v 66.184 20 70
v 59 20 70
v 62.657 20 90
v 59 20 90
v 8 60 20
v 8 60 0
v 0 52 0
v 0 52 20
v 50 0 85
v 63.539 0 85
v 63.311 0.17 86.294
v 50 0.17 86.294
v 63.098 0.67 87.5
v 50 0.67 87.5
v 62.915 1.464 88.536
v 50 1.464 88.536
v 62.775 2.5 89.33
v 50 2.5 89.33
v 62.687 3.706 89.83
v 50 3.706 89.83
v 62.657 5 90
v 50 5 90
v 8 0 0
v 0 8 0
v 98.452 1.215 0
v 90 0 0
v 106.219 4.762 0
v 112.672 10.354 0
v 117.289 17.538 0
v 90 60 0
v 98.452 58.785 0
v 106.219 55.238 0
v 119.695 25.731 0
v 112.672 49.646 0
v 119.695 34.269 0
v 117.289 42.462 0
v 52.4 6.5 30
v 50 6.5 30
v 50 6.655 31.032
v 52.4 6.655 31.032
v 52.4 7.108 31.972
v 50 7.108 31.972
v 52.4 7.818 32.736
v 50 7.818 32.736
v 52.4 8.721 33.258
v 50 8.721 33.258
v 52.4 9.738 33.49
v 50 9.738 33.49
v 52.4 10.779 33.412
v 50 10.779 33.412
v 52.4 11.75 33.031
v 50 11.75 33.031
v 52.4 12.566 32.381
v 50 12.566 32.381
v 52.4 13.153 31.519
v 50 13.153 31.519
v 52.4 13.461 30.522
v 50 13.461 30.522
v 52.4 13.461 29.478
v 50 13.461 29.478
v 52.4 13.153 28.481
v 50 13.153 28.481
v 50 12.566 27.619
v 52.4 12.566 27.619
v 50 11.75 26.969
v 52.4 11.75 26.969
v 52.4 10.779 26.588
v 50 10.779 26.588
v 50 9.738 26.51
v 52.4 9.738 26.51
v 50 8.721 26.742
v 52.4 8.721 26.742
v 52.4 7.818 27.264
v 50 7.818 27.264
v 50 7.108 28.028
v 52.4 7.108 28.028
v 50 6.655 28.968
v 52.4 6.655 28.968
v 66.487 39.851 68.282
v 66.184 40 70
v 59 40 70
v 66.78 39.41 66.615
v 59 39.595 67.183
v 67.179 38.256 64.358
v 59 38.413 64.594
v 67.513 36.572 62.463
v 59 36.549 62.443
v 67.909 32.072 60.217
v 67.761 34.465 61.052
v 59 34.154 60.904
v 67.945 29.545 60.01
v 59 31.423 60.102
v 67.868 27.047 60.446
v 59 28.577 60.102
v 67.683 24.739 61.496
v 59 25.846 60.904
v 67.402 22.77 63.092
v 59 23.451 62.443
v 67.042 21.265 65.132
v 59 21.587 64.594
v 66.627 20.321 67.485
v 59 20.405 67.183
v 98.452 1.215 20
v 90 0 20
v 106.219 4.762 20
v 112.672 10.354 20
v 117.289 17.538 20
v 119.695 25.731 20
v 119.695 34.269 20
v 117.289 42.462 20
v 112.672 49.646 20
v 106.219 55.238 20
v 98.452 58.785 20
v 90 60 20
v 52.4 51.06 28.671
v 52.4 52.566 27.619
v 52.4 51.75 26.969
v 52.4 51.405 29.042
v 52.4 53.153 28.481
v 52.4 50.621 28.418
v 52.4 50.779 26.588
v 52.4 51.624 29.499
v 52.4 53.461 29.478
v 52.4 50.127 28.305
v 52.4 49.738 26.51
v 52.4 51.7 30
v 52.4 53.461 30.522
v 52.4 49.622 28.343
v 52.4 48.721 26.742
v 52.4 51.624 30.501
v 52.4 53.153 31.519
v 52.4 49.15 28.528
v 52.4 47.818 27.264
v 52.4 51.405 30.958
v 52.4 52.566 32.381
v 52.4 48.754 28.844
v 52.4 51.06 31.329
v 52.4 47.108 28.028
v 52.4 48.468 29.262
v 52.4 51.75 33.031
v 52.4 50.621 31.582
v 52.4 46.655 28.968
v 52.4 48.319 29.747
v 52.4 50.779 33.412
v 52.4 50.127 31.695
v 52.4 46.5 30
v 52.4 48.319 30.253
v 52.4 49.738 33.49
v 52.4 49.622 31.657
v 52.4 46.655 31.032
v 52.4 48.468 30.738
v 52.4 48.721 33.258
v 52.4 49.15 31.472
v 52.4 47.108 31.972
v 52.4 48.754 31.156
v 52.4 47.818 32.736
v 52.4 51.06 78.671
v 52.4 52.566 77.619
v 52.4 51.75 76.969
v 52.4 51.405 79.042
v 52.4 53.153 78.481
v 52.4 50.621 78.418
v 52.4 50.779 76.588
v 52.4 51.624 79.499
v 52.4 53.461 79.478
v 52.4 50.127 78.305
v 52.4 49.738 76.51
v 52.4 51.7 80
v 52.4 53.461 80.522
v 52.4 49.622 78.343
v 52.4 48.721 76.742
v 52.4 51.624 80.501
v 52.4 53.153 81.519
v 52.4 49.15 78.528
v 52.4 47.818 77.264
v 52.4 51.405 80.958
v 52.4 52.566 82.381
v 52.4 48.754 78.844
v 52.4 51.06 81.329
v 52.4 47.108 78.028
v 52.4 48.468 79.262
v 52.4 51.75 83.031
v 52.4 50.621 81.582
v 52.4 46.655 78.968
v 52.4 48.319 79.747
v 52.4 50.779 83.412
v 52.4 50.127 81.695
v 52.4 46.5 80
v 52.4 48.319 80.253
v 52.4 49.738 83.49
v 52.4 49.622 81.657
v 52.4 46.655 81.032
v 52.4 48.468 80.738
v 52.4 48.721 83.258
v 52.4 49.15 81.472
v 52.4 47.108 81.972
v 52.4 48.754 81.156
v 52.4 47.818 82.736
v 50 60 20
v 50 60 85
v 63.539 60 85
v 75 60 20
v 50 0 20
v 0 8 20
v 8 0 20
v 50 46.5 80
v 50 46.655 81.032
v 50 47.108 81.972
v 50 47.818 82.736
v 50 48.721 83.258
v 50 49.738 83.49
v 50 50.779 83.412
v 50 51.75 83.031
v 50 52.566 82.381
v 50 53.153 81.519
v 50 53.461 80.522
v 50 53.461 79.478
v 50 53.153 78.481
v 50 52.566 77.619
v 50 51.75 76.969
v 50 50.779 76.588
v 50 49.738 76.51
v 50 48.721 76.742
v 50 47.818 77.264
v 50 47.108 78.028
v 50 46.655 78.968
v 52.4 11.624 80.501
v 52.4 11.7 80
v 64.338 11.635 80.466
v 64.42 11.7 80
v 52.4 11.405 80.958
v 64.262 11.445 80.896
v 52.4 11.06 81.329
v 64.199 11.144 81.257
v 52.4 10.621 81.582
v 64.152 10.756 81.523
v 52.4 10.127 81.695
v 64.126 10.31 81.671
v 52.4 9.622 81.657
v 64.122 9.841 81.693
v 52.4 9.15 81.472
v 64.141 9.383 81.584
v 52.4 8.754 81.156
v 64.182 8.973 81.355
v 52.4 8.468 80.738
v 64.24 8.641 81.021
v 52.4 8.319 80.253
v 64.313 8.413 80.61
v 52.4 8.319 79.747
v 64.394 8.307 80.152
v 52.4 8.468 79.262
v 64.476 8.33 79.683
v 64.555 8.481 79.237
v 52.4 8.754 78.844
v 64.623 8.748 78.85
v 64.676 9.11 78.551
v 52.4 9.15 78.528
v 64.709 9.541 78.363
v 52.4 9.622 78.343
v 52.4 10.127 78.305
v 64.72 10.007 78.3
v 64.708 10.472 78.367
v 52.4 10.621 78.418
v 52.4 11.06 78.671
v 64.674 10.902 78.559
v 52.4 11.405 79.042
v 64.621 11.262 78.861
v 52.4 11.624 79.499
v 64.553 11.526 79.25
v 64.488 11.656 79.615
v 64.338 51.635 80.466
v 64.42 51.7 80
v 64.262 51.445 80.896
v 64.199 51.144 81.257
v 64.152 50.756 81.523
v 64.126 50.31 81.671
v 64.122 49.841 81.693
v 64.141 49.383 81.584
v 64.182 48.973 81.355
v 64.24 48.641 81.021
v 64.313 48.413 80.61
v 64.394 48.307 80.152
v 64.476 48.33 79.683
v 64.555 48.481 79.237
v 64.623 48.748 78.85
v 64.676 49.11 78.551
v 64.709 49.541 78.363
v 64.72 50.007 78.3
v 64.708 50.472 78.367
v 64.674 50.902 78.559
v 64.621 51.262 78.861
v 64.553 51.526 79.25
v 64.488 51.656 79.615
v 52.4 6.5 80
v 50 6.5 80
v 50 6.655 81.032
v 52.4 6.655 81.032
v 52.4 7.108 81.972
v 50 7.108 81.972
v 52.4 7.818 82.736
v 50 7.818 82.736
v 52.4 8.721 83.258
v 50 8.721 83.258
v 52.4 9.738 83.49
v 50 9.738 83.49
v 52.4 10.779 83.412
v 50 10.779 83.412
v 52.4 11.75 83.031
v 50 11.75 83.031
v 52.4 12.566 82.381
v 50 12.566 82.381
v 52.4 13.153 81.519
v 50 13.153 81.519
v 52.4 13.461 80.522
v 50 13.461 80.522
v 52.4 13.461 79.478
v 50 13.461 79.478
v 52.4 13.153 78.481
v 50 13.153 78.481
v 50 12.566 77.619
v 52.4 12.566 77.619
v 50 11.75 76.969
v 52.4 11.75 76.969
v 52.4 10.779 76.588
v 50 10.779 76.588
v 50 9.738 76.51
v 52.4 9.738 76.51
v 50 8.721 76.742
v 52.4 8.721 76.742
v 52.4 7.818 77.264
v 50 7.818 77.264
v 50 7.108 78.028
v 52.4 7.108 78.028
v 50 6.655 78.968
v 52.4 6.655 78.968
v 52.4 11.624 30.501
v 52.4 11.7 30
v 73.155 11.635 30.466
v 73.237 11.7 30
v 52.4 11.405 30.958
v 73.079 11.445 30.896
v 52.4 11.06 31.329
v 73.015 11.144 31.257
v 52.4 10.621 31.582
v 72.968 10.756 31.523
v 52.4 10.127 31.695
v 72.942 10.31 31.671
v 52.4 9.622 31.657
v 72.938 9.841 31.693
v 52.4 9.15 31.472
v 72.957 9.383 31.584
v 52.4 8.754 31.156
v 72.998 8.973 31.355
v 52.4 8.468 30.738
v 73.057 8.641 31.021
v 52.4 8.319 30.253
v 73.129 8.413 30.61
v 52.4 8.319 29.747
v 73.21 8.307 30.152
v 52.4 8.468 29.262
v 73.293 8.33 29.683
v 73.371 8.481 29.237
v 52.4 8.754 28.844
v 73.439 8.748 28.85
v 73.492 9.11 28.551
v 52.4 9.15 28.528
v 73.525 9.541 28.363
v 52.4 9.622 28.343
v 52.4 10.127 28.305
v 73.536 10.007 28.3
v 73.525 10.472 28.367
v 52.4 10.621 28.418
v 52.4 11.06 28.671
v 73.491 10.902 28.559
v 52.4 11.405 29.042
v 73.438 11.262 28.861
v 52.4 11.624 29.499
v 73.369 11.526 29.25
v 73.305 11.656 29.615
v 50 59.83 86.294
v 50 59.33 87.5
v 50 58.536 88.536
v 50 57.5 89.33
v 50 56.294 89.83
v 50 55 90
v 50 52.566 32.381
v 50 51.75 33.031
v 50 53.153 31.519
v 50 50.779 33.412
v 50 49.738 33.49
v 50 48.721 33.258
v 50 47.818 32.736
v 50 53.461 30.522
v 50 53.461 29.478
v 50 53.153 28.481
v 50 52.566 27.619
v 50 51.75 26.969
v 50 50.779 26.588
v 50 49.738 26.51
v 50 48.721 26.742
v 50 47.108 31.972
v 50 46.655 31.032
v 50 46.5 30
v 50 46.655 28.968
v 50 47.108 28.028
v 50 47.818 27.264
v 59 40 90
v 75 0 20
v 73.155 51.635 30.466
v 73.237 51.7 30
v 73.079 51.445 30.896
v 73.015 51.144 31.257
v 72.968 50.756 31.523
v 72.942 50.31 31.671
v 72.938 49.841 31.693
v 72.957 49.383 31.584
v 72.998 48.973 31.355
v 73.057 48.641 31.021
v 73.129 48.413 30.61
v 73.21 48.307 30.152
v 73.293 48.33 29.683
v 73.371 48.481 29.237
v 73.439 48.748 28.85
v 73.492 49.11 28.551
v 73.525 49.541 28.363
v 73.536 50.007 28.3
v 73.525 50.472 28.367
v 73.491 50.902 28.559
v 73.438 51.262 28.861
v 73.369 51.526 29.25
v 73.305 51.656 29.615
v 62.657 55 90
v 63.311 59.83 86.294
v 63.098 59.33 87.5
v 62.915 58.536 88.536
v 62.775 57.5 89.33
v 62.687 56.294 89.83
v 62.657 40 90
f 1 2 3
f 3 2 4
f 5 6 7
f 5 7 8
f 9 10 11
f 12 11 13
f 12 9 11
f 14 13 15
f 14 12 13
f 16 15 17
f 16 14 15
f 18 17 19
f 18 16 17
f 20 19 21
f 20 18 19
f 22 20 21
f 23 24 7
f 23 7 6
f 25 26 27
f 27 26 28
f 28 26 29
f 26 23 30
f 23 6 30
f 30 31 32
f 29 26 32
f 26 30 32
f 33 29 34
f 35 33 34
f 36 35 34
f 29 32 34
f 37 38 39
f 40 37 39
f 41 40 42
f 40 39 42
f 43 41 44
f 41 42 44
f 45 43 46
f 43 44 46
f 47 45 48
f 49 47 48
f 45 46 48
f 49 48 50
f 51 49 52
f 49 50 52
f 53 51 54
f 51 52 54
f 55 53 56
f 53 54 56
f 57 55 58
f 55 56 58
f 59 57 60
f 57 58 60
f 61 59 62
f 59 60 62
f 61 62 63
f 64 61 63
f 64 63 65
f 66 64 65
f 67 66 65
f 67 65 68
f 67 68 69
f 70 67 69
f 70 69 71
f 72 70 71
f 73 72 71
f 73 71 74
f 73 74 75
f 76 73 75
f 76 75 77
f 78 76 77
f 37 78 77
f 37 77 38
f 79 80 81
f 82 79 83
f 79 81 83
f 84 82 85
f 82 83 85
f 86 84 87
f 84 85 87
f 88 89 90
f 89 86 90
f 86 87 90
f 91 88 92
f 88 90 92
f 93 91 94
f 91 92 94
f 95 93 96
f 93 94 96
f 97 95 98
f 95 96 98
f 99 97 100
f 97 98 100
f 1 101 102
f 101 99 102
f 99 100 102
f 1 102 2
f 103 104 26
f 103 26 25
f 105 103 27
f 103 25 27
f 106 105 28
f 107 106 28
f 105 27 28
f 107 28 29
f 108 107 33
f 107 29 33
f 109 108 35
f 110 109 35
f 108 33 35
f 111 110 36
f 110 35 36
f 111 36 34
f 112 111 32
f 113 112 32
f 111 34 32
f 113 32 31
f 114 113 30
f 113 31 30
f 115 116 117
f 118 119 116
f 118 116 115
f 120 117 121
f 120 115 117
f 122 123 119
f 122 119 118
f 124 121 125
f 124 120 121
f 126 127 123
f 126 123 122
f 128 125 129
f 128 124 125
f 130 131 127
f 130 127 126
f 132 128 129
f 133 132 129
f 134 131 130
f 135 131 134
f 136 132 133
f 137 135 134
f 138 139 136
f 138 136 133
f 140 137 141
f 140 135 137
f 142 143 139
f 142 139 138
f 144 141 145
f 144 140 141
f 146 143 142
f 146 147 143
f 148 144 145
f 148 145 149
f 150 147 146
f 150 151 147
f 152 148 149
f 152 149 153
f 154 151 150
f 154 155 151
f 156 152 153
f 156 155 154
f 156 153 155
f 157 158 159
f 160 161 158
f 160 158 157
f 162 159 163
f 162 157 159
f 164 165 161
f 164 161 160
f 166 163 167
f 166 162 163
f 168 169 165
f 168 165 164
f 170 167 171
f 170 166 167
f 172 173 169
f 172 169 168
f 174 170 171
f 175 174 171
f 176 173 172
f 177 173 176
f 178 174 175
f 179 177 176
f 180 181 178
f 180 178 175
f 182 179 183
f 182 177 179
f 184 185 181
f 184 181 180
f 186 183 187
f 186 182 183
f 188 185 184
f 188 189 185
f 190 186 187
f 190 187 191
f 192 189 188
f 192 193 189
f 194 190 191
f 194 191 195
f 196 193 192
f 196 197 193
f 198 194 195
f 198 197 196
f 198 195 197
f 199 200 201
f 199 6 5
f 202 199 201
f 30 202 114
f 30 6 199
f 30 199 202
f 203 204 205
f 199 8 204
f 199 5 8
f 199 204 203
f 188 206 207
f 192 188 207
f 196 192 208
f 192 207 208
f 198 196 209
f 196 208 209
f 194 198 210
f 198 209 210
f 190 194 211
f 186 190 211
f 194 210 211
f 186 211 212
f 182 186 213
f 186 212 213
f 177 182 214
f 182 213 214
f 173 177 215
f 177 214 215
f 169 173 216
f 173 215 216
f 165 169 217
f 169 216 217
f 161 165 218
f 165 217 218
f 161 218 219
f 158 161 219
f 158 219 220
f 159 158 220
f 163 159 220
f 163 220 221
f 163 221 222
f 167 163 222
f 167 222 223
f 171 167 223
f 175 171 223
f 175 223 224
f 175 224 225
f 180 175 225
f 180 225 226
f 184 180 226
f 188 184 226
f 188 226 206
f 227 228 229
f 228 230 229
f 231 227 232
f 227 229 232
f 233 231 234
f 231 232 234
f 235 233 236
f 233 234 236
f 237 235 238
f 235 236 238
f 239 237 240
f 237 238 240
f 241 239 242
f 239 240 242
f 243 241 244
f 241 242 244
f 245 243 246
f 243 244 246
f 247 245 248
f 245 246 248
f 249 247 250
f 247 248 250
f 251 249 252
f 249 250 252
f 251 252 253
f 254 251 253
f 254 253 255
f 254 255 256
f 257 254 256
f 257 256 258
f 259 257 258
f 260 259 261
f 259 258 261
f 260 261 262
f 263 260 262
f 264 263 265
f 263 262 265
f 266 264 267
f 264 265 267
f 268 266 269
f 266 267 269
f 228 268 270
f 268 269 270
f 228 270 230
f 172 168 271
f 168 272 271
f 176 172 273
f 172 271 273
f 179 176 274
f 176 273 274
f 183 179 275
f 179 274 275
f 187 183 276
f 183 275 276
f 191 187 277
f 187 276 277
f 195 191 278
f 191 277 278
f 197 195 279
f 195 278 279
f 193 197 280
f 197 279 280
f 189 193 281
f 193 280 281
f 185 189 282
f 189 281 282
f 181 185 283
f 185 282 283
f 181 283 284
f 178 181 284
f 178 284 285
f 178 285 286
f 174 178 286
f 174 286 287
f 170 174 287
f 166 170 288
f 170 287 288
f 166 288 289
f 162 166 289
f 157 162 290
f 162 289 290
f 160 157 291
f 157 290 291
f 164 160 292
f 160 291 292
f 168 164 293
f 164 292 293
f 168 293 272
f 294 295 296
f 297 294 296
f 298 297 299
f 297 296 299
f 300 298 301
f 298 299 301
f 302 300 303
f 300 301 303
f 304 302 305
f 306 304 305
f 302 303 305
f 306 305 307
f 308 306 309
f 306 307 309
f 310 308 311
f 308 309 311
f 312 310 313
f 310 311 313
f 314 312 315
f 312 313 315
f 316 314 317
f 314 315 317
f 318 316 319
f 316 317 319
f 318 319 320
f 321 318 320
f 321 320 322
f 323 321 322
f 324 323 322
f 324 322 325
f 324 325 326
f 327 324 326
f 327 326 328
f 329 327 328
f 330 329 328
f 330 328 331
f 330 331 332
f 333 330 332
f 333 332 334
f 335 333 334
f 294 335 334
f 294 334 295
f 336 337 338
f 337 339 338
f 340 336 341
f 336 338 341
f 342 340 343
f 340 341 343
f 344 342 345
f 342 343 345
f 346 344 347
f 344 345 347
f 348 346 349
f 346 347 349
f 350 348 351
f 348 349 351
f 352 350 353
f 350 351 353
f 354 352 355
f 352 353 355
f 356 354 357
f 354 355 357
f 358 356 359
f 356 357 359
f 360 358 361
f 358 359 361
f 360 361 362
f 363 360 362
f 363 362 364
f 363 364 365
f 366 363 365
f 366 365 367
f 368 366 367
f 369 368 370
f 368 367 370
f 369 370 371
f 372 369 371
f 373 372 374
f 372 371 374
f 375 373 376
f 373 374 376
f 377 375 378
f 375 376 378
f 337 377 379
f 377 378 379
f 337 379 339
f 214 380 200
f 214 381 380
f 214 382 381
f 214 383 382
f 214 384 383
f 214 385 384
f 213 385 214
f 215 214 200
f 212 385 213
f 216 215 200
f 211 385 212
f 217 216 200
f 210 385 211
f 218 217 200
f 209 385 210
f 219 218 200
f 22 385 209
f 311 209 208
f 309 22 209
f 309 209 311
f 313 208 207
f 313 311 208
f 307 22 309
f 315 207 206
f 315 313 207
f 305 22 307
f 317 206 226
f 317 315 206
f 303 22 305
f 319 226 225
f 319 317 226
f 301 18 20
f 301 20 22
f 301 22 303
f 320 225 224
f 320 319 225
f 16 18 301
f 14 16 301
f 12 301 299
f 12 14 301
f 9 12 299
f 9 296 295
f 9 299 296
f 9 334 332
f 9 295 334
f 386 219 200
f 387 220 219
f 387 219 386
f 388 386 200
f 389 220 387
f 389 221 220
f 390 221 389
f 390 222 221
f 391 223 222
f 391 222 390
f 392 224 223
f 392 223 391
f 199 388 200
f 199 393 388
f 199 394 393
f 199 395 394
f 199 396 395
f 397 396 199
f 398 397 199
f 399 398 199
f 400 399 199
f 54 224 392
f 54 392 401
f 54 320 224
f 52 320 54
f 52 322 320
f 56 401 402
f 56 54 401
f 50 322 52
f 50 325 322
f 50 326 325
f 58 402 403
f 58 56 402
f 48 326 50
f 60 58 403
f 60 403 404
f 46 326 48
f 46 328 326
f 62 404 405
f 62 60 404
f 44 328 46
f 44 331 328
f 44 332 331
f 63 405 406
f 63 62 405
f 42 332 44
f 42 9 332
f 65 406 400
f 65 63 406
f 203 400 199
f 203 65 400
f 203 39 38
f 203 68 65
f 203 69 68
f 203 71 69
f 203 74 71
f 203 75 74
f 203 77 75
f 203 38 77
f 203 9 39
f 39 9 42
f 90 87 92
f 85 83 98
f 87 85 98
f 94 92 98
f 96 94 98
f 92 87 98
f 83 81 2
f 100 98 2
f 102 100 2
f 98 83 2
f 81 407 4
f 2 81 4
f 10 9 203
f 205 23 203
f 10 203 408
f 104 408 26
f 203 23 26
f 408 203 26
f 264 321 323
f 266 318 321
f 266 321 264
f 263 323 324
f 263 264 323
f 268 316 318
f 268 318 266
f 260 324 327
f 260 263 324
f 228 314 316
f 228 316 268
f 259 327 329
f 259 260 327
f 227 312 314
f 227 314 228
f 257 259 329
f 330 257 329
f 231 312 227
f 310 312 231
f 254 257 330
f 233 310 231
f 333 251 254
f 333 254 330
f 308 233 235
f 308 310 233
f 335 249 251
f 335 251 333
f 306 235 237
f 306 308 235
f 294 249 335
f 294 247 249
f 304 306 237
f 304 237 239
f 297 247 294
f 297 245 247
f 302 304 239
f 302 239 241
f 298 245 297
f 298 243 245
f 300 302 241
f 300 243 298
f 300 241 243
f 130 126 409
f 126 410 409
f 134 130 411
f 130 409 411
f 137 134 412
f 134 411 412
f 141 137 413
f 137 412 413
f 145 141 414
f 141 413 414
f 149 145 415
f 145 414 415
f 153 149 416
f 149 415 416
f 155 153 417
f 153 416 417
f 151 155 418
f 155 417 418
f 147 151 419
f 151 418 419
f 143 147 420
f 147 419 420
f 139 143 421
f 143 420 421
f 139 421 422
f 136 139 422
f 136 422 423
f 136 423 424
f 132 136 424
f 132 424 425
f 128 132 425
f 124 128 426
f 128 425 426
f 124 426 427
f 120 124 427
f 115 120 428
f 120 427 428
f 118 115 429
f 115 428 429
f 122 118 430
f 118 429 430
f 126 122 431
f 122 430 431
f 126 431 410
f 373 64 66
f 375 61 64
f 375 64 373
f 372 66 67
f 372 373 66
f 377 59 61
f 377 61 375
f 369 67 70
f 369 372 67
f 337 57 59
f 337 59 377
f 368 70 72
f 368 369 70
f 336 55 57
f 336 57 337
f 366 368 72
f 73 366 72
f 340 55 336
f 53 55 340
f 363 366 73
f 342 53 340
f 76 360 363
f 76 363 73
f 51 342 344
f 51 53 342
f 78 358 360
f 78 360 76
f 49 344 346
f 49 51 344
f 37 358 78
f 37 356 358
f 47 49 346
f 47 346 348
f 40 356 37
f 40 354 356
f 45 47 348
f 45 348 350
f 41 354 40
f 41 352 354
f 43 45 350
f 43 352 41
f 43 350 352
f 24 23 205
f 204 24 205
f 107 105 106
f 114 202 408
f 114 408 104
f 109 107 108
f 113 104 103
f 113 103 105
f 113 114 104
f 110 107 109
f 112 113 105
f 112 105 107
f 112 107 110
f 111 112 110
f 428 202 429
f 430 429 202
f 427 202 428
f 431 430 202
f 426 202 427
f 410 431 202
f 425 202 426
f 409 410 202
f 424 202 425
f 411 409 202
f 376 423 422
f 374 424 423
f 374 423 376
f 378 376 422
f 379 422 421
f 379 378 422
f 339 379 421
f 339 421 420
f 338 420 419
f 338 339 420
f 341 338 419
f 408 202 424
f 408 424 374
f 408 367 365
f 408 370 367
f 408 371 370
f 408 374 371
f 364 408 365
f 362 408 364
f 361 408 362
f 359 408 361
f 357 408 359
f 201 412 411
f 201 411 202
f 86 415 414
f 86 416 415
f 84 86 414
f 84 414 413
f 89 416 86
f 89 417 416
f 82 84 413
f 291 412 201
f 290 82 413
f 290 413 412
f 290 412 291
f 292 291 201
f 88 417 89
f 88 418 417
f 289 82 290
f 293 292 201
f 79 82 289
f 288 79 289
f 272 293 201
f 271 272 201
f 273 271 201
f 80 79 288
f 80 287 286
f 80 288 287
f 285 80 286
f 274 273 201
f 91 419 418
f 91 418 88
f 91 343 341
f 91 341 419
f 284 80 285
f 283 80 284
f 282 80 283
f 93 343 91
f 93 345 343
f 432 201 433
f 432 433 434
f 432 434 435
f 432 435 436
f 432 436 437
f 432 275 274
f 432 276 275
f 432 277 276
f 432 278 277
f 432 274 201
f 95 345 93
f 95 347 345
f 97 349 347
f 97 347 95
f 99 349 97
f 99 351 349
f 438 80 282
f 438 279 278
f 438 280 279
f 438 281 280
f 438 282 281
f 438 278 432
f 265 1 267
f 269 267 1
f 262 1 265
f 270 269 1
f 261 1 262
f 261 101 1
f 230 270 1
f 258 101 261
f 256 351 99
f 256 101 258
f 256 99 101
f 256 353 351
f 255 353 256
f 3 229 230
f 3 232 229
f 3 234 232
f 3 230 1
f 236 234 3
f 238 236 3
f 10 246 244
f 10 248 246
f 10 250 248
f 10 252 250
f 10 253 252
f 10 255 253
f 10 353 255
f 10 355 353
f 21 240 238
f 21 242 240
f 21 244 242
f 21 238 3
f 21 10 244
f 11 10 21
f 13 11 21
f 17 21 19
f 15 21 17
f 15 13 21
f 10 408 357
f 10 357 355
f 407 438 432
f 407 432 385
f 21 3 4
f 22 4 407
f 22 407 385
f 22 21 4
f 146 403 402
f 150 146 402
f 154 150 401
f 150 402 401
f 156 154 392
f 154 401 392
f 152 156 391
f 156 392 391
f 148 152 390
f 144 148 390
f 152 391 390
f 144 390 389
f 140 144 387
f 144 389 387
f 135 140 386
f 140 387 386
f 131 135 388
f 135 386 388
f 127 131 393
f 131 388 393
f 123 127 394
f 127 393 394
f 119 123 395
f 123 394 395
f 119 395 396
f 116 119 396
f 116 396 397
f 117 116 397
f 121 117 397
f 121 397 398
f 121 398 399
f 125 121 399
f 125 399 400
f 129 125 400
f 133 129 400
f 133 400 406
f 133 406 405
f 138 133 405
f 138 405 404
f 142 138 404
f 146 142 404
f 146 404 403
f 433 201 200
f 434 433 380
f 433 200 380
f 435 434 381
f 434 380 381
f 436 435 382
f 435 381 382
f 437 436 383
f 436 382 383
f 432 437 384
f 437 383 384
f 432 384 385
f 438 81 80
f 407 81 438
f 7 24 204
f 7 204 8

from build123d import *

# Parameters (mm, degrees)
F0_W           = 90
F0_H           = 60
F1_DEPTH       = 20
F2_SIZE        = 8
F4_DEPTH       = 60
F5_R           = 5
F7_D           = 3.4
F7_CBORE_D     = 7
F7_CBORE_DEPTH = 2.4
F9_W           = 20
F9_H           = 20
F10_DEPTH      = 8.9479207717


with BuildPart() as f1:
    # F0 (on Top) → F1 (new body)
    with BuildSketch(Plane.XY):
        with Locations((45, 30)):
            Rectangle(F0_W, F0_H)
        with BuildLine():
            Line((90, 60), (90, 0))
            ThreePointArc((90, 0), (120, 30), (90, 60))
        make_face()
    extrude(amount=F1_DEPTH)

    # F2
    f2_edges = [f1.edges().sort_by_distance(p)[0] for p in [
        (0, 0, 10),
        (0, 60, 10),
    ]]
    chamfer(f2_edges, length=F2_SIZE)

    # F3 (on Front) → F4 (join, through all)
    with BuildSketch(Plane.XZ):
        Polygon((50, 90), (50, 20), (75, 20), (62.6571113504, 90), align=None)
    extrude(amount=-F4_DEPTH)

    # F5
    f5_edges = [f1.edges().sort_by_distance(p)[0] for p in [
        (56.328556, 0, 90),
        (56.328556, 60, 90),
    ]]
    fillet(f5_edges, radius=F5_R)

    # F7 (through all)
    with Locations(Plane(origin=(50, 0, 0), x_dir=(0, -1, 0), z_dir=(-1, 0, 0))):
        with Locations((-50, 80), (-50, 30), (-10, 30), (-10, 80)):
            CounterBoreHole(F7_D / 2, F7_CBORE_D / 2, F7_CBORE_DEPTH)

    # F9 (on offset) → F10 (cut, through all)
    with BuildSketch(Plane(origin=(59, 0, 0), x_dir=(0, -1, 0), z_dir=(-1, 0, 0))):
        with Locations((-30, 80)):
            Rectangle(F9_W, F9_H)
        with BuildLine():
            ThreePointArc((-40, 70), (-30, 60), (-20, 70))
            Line((-20, 70), (-40, 70))
        make_face()
    extrude(amount=-F10_DEPTH, mode=Mode.SUBTRACT)


solid = f1.part
